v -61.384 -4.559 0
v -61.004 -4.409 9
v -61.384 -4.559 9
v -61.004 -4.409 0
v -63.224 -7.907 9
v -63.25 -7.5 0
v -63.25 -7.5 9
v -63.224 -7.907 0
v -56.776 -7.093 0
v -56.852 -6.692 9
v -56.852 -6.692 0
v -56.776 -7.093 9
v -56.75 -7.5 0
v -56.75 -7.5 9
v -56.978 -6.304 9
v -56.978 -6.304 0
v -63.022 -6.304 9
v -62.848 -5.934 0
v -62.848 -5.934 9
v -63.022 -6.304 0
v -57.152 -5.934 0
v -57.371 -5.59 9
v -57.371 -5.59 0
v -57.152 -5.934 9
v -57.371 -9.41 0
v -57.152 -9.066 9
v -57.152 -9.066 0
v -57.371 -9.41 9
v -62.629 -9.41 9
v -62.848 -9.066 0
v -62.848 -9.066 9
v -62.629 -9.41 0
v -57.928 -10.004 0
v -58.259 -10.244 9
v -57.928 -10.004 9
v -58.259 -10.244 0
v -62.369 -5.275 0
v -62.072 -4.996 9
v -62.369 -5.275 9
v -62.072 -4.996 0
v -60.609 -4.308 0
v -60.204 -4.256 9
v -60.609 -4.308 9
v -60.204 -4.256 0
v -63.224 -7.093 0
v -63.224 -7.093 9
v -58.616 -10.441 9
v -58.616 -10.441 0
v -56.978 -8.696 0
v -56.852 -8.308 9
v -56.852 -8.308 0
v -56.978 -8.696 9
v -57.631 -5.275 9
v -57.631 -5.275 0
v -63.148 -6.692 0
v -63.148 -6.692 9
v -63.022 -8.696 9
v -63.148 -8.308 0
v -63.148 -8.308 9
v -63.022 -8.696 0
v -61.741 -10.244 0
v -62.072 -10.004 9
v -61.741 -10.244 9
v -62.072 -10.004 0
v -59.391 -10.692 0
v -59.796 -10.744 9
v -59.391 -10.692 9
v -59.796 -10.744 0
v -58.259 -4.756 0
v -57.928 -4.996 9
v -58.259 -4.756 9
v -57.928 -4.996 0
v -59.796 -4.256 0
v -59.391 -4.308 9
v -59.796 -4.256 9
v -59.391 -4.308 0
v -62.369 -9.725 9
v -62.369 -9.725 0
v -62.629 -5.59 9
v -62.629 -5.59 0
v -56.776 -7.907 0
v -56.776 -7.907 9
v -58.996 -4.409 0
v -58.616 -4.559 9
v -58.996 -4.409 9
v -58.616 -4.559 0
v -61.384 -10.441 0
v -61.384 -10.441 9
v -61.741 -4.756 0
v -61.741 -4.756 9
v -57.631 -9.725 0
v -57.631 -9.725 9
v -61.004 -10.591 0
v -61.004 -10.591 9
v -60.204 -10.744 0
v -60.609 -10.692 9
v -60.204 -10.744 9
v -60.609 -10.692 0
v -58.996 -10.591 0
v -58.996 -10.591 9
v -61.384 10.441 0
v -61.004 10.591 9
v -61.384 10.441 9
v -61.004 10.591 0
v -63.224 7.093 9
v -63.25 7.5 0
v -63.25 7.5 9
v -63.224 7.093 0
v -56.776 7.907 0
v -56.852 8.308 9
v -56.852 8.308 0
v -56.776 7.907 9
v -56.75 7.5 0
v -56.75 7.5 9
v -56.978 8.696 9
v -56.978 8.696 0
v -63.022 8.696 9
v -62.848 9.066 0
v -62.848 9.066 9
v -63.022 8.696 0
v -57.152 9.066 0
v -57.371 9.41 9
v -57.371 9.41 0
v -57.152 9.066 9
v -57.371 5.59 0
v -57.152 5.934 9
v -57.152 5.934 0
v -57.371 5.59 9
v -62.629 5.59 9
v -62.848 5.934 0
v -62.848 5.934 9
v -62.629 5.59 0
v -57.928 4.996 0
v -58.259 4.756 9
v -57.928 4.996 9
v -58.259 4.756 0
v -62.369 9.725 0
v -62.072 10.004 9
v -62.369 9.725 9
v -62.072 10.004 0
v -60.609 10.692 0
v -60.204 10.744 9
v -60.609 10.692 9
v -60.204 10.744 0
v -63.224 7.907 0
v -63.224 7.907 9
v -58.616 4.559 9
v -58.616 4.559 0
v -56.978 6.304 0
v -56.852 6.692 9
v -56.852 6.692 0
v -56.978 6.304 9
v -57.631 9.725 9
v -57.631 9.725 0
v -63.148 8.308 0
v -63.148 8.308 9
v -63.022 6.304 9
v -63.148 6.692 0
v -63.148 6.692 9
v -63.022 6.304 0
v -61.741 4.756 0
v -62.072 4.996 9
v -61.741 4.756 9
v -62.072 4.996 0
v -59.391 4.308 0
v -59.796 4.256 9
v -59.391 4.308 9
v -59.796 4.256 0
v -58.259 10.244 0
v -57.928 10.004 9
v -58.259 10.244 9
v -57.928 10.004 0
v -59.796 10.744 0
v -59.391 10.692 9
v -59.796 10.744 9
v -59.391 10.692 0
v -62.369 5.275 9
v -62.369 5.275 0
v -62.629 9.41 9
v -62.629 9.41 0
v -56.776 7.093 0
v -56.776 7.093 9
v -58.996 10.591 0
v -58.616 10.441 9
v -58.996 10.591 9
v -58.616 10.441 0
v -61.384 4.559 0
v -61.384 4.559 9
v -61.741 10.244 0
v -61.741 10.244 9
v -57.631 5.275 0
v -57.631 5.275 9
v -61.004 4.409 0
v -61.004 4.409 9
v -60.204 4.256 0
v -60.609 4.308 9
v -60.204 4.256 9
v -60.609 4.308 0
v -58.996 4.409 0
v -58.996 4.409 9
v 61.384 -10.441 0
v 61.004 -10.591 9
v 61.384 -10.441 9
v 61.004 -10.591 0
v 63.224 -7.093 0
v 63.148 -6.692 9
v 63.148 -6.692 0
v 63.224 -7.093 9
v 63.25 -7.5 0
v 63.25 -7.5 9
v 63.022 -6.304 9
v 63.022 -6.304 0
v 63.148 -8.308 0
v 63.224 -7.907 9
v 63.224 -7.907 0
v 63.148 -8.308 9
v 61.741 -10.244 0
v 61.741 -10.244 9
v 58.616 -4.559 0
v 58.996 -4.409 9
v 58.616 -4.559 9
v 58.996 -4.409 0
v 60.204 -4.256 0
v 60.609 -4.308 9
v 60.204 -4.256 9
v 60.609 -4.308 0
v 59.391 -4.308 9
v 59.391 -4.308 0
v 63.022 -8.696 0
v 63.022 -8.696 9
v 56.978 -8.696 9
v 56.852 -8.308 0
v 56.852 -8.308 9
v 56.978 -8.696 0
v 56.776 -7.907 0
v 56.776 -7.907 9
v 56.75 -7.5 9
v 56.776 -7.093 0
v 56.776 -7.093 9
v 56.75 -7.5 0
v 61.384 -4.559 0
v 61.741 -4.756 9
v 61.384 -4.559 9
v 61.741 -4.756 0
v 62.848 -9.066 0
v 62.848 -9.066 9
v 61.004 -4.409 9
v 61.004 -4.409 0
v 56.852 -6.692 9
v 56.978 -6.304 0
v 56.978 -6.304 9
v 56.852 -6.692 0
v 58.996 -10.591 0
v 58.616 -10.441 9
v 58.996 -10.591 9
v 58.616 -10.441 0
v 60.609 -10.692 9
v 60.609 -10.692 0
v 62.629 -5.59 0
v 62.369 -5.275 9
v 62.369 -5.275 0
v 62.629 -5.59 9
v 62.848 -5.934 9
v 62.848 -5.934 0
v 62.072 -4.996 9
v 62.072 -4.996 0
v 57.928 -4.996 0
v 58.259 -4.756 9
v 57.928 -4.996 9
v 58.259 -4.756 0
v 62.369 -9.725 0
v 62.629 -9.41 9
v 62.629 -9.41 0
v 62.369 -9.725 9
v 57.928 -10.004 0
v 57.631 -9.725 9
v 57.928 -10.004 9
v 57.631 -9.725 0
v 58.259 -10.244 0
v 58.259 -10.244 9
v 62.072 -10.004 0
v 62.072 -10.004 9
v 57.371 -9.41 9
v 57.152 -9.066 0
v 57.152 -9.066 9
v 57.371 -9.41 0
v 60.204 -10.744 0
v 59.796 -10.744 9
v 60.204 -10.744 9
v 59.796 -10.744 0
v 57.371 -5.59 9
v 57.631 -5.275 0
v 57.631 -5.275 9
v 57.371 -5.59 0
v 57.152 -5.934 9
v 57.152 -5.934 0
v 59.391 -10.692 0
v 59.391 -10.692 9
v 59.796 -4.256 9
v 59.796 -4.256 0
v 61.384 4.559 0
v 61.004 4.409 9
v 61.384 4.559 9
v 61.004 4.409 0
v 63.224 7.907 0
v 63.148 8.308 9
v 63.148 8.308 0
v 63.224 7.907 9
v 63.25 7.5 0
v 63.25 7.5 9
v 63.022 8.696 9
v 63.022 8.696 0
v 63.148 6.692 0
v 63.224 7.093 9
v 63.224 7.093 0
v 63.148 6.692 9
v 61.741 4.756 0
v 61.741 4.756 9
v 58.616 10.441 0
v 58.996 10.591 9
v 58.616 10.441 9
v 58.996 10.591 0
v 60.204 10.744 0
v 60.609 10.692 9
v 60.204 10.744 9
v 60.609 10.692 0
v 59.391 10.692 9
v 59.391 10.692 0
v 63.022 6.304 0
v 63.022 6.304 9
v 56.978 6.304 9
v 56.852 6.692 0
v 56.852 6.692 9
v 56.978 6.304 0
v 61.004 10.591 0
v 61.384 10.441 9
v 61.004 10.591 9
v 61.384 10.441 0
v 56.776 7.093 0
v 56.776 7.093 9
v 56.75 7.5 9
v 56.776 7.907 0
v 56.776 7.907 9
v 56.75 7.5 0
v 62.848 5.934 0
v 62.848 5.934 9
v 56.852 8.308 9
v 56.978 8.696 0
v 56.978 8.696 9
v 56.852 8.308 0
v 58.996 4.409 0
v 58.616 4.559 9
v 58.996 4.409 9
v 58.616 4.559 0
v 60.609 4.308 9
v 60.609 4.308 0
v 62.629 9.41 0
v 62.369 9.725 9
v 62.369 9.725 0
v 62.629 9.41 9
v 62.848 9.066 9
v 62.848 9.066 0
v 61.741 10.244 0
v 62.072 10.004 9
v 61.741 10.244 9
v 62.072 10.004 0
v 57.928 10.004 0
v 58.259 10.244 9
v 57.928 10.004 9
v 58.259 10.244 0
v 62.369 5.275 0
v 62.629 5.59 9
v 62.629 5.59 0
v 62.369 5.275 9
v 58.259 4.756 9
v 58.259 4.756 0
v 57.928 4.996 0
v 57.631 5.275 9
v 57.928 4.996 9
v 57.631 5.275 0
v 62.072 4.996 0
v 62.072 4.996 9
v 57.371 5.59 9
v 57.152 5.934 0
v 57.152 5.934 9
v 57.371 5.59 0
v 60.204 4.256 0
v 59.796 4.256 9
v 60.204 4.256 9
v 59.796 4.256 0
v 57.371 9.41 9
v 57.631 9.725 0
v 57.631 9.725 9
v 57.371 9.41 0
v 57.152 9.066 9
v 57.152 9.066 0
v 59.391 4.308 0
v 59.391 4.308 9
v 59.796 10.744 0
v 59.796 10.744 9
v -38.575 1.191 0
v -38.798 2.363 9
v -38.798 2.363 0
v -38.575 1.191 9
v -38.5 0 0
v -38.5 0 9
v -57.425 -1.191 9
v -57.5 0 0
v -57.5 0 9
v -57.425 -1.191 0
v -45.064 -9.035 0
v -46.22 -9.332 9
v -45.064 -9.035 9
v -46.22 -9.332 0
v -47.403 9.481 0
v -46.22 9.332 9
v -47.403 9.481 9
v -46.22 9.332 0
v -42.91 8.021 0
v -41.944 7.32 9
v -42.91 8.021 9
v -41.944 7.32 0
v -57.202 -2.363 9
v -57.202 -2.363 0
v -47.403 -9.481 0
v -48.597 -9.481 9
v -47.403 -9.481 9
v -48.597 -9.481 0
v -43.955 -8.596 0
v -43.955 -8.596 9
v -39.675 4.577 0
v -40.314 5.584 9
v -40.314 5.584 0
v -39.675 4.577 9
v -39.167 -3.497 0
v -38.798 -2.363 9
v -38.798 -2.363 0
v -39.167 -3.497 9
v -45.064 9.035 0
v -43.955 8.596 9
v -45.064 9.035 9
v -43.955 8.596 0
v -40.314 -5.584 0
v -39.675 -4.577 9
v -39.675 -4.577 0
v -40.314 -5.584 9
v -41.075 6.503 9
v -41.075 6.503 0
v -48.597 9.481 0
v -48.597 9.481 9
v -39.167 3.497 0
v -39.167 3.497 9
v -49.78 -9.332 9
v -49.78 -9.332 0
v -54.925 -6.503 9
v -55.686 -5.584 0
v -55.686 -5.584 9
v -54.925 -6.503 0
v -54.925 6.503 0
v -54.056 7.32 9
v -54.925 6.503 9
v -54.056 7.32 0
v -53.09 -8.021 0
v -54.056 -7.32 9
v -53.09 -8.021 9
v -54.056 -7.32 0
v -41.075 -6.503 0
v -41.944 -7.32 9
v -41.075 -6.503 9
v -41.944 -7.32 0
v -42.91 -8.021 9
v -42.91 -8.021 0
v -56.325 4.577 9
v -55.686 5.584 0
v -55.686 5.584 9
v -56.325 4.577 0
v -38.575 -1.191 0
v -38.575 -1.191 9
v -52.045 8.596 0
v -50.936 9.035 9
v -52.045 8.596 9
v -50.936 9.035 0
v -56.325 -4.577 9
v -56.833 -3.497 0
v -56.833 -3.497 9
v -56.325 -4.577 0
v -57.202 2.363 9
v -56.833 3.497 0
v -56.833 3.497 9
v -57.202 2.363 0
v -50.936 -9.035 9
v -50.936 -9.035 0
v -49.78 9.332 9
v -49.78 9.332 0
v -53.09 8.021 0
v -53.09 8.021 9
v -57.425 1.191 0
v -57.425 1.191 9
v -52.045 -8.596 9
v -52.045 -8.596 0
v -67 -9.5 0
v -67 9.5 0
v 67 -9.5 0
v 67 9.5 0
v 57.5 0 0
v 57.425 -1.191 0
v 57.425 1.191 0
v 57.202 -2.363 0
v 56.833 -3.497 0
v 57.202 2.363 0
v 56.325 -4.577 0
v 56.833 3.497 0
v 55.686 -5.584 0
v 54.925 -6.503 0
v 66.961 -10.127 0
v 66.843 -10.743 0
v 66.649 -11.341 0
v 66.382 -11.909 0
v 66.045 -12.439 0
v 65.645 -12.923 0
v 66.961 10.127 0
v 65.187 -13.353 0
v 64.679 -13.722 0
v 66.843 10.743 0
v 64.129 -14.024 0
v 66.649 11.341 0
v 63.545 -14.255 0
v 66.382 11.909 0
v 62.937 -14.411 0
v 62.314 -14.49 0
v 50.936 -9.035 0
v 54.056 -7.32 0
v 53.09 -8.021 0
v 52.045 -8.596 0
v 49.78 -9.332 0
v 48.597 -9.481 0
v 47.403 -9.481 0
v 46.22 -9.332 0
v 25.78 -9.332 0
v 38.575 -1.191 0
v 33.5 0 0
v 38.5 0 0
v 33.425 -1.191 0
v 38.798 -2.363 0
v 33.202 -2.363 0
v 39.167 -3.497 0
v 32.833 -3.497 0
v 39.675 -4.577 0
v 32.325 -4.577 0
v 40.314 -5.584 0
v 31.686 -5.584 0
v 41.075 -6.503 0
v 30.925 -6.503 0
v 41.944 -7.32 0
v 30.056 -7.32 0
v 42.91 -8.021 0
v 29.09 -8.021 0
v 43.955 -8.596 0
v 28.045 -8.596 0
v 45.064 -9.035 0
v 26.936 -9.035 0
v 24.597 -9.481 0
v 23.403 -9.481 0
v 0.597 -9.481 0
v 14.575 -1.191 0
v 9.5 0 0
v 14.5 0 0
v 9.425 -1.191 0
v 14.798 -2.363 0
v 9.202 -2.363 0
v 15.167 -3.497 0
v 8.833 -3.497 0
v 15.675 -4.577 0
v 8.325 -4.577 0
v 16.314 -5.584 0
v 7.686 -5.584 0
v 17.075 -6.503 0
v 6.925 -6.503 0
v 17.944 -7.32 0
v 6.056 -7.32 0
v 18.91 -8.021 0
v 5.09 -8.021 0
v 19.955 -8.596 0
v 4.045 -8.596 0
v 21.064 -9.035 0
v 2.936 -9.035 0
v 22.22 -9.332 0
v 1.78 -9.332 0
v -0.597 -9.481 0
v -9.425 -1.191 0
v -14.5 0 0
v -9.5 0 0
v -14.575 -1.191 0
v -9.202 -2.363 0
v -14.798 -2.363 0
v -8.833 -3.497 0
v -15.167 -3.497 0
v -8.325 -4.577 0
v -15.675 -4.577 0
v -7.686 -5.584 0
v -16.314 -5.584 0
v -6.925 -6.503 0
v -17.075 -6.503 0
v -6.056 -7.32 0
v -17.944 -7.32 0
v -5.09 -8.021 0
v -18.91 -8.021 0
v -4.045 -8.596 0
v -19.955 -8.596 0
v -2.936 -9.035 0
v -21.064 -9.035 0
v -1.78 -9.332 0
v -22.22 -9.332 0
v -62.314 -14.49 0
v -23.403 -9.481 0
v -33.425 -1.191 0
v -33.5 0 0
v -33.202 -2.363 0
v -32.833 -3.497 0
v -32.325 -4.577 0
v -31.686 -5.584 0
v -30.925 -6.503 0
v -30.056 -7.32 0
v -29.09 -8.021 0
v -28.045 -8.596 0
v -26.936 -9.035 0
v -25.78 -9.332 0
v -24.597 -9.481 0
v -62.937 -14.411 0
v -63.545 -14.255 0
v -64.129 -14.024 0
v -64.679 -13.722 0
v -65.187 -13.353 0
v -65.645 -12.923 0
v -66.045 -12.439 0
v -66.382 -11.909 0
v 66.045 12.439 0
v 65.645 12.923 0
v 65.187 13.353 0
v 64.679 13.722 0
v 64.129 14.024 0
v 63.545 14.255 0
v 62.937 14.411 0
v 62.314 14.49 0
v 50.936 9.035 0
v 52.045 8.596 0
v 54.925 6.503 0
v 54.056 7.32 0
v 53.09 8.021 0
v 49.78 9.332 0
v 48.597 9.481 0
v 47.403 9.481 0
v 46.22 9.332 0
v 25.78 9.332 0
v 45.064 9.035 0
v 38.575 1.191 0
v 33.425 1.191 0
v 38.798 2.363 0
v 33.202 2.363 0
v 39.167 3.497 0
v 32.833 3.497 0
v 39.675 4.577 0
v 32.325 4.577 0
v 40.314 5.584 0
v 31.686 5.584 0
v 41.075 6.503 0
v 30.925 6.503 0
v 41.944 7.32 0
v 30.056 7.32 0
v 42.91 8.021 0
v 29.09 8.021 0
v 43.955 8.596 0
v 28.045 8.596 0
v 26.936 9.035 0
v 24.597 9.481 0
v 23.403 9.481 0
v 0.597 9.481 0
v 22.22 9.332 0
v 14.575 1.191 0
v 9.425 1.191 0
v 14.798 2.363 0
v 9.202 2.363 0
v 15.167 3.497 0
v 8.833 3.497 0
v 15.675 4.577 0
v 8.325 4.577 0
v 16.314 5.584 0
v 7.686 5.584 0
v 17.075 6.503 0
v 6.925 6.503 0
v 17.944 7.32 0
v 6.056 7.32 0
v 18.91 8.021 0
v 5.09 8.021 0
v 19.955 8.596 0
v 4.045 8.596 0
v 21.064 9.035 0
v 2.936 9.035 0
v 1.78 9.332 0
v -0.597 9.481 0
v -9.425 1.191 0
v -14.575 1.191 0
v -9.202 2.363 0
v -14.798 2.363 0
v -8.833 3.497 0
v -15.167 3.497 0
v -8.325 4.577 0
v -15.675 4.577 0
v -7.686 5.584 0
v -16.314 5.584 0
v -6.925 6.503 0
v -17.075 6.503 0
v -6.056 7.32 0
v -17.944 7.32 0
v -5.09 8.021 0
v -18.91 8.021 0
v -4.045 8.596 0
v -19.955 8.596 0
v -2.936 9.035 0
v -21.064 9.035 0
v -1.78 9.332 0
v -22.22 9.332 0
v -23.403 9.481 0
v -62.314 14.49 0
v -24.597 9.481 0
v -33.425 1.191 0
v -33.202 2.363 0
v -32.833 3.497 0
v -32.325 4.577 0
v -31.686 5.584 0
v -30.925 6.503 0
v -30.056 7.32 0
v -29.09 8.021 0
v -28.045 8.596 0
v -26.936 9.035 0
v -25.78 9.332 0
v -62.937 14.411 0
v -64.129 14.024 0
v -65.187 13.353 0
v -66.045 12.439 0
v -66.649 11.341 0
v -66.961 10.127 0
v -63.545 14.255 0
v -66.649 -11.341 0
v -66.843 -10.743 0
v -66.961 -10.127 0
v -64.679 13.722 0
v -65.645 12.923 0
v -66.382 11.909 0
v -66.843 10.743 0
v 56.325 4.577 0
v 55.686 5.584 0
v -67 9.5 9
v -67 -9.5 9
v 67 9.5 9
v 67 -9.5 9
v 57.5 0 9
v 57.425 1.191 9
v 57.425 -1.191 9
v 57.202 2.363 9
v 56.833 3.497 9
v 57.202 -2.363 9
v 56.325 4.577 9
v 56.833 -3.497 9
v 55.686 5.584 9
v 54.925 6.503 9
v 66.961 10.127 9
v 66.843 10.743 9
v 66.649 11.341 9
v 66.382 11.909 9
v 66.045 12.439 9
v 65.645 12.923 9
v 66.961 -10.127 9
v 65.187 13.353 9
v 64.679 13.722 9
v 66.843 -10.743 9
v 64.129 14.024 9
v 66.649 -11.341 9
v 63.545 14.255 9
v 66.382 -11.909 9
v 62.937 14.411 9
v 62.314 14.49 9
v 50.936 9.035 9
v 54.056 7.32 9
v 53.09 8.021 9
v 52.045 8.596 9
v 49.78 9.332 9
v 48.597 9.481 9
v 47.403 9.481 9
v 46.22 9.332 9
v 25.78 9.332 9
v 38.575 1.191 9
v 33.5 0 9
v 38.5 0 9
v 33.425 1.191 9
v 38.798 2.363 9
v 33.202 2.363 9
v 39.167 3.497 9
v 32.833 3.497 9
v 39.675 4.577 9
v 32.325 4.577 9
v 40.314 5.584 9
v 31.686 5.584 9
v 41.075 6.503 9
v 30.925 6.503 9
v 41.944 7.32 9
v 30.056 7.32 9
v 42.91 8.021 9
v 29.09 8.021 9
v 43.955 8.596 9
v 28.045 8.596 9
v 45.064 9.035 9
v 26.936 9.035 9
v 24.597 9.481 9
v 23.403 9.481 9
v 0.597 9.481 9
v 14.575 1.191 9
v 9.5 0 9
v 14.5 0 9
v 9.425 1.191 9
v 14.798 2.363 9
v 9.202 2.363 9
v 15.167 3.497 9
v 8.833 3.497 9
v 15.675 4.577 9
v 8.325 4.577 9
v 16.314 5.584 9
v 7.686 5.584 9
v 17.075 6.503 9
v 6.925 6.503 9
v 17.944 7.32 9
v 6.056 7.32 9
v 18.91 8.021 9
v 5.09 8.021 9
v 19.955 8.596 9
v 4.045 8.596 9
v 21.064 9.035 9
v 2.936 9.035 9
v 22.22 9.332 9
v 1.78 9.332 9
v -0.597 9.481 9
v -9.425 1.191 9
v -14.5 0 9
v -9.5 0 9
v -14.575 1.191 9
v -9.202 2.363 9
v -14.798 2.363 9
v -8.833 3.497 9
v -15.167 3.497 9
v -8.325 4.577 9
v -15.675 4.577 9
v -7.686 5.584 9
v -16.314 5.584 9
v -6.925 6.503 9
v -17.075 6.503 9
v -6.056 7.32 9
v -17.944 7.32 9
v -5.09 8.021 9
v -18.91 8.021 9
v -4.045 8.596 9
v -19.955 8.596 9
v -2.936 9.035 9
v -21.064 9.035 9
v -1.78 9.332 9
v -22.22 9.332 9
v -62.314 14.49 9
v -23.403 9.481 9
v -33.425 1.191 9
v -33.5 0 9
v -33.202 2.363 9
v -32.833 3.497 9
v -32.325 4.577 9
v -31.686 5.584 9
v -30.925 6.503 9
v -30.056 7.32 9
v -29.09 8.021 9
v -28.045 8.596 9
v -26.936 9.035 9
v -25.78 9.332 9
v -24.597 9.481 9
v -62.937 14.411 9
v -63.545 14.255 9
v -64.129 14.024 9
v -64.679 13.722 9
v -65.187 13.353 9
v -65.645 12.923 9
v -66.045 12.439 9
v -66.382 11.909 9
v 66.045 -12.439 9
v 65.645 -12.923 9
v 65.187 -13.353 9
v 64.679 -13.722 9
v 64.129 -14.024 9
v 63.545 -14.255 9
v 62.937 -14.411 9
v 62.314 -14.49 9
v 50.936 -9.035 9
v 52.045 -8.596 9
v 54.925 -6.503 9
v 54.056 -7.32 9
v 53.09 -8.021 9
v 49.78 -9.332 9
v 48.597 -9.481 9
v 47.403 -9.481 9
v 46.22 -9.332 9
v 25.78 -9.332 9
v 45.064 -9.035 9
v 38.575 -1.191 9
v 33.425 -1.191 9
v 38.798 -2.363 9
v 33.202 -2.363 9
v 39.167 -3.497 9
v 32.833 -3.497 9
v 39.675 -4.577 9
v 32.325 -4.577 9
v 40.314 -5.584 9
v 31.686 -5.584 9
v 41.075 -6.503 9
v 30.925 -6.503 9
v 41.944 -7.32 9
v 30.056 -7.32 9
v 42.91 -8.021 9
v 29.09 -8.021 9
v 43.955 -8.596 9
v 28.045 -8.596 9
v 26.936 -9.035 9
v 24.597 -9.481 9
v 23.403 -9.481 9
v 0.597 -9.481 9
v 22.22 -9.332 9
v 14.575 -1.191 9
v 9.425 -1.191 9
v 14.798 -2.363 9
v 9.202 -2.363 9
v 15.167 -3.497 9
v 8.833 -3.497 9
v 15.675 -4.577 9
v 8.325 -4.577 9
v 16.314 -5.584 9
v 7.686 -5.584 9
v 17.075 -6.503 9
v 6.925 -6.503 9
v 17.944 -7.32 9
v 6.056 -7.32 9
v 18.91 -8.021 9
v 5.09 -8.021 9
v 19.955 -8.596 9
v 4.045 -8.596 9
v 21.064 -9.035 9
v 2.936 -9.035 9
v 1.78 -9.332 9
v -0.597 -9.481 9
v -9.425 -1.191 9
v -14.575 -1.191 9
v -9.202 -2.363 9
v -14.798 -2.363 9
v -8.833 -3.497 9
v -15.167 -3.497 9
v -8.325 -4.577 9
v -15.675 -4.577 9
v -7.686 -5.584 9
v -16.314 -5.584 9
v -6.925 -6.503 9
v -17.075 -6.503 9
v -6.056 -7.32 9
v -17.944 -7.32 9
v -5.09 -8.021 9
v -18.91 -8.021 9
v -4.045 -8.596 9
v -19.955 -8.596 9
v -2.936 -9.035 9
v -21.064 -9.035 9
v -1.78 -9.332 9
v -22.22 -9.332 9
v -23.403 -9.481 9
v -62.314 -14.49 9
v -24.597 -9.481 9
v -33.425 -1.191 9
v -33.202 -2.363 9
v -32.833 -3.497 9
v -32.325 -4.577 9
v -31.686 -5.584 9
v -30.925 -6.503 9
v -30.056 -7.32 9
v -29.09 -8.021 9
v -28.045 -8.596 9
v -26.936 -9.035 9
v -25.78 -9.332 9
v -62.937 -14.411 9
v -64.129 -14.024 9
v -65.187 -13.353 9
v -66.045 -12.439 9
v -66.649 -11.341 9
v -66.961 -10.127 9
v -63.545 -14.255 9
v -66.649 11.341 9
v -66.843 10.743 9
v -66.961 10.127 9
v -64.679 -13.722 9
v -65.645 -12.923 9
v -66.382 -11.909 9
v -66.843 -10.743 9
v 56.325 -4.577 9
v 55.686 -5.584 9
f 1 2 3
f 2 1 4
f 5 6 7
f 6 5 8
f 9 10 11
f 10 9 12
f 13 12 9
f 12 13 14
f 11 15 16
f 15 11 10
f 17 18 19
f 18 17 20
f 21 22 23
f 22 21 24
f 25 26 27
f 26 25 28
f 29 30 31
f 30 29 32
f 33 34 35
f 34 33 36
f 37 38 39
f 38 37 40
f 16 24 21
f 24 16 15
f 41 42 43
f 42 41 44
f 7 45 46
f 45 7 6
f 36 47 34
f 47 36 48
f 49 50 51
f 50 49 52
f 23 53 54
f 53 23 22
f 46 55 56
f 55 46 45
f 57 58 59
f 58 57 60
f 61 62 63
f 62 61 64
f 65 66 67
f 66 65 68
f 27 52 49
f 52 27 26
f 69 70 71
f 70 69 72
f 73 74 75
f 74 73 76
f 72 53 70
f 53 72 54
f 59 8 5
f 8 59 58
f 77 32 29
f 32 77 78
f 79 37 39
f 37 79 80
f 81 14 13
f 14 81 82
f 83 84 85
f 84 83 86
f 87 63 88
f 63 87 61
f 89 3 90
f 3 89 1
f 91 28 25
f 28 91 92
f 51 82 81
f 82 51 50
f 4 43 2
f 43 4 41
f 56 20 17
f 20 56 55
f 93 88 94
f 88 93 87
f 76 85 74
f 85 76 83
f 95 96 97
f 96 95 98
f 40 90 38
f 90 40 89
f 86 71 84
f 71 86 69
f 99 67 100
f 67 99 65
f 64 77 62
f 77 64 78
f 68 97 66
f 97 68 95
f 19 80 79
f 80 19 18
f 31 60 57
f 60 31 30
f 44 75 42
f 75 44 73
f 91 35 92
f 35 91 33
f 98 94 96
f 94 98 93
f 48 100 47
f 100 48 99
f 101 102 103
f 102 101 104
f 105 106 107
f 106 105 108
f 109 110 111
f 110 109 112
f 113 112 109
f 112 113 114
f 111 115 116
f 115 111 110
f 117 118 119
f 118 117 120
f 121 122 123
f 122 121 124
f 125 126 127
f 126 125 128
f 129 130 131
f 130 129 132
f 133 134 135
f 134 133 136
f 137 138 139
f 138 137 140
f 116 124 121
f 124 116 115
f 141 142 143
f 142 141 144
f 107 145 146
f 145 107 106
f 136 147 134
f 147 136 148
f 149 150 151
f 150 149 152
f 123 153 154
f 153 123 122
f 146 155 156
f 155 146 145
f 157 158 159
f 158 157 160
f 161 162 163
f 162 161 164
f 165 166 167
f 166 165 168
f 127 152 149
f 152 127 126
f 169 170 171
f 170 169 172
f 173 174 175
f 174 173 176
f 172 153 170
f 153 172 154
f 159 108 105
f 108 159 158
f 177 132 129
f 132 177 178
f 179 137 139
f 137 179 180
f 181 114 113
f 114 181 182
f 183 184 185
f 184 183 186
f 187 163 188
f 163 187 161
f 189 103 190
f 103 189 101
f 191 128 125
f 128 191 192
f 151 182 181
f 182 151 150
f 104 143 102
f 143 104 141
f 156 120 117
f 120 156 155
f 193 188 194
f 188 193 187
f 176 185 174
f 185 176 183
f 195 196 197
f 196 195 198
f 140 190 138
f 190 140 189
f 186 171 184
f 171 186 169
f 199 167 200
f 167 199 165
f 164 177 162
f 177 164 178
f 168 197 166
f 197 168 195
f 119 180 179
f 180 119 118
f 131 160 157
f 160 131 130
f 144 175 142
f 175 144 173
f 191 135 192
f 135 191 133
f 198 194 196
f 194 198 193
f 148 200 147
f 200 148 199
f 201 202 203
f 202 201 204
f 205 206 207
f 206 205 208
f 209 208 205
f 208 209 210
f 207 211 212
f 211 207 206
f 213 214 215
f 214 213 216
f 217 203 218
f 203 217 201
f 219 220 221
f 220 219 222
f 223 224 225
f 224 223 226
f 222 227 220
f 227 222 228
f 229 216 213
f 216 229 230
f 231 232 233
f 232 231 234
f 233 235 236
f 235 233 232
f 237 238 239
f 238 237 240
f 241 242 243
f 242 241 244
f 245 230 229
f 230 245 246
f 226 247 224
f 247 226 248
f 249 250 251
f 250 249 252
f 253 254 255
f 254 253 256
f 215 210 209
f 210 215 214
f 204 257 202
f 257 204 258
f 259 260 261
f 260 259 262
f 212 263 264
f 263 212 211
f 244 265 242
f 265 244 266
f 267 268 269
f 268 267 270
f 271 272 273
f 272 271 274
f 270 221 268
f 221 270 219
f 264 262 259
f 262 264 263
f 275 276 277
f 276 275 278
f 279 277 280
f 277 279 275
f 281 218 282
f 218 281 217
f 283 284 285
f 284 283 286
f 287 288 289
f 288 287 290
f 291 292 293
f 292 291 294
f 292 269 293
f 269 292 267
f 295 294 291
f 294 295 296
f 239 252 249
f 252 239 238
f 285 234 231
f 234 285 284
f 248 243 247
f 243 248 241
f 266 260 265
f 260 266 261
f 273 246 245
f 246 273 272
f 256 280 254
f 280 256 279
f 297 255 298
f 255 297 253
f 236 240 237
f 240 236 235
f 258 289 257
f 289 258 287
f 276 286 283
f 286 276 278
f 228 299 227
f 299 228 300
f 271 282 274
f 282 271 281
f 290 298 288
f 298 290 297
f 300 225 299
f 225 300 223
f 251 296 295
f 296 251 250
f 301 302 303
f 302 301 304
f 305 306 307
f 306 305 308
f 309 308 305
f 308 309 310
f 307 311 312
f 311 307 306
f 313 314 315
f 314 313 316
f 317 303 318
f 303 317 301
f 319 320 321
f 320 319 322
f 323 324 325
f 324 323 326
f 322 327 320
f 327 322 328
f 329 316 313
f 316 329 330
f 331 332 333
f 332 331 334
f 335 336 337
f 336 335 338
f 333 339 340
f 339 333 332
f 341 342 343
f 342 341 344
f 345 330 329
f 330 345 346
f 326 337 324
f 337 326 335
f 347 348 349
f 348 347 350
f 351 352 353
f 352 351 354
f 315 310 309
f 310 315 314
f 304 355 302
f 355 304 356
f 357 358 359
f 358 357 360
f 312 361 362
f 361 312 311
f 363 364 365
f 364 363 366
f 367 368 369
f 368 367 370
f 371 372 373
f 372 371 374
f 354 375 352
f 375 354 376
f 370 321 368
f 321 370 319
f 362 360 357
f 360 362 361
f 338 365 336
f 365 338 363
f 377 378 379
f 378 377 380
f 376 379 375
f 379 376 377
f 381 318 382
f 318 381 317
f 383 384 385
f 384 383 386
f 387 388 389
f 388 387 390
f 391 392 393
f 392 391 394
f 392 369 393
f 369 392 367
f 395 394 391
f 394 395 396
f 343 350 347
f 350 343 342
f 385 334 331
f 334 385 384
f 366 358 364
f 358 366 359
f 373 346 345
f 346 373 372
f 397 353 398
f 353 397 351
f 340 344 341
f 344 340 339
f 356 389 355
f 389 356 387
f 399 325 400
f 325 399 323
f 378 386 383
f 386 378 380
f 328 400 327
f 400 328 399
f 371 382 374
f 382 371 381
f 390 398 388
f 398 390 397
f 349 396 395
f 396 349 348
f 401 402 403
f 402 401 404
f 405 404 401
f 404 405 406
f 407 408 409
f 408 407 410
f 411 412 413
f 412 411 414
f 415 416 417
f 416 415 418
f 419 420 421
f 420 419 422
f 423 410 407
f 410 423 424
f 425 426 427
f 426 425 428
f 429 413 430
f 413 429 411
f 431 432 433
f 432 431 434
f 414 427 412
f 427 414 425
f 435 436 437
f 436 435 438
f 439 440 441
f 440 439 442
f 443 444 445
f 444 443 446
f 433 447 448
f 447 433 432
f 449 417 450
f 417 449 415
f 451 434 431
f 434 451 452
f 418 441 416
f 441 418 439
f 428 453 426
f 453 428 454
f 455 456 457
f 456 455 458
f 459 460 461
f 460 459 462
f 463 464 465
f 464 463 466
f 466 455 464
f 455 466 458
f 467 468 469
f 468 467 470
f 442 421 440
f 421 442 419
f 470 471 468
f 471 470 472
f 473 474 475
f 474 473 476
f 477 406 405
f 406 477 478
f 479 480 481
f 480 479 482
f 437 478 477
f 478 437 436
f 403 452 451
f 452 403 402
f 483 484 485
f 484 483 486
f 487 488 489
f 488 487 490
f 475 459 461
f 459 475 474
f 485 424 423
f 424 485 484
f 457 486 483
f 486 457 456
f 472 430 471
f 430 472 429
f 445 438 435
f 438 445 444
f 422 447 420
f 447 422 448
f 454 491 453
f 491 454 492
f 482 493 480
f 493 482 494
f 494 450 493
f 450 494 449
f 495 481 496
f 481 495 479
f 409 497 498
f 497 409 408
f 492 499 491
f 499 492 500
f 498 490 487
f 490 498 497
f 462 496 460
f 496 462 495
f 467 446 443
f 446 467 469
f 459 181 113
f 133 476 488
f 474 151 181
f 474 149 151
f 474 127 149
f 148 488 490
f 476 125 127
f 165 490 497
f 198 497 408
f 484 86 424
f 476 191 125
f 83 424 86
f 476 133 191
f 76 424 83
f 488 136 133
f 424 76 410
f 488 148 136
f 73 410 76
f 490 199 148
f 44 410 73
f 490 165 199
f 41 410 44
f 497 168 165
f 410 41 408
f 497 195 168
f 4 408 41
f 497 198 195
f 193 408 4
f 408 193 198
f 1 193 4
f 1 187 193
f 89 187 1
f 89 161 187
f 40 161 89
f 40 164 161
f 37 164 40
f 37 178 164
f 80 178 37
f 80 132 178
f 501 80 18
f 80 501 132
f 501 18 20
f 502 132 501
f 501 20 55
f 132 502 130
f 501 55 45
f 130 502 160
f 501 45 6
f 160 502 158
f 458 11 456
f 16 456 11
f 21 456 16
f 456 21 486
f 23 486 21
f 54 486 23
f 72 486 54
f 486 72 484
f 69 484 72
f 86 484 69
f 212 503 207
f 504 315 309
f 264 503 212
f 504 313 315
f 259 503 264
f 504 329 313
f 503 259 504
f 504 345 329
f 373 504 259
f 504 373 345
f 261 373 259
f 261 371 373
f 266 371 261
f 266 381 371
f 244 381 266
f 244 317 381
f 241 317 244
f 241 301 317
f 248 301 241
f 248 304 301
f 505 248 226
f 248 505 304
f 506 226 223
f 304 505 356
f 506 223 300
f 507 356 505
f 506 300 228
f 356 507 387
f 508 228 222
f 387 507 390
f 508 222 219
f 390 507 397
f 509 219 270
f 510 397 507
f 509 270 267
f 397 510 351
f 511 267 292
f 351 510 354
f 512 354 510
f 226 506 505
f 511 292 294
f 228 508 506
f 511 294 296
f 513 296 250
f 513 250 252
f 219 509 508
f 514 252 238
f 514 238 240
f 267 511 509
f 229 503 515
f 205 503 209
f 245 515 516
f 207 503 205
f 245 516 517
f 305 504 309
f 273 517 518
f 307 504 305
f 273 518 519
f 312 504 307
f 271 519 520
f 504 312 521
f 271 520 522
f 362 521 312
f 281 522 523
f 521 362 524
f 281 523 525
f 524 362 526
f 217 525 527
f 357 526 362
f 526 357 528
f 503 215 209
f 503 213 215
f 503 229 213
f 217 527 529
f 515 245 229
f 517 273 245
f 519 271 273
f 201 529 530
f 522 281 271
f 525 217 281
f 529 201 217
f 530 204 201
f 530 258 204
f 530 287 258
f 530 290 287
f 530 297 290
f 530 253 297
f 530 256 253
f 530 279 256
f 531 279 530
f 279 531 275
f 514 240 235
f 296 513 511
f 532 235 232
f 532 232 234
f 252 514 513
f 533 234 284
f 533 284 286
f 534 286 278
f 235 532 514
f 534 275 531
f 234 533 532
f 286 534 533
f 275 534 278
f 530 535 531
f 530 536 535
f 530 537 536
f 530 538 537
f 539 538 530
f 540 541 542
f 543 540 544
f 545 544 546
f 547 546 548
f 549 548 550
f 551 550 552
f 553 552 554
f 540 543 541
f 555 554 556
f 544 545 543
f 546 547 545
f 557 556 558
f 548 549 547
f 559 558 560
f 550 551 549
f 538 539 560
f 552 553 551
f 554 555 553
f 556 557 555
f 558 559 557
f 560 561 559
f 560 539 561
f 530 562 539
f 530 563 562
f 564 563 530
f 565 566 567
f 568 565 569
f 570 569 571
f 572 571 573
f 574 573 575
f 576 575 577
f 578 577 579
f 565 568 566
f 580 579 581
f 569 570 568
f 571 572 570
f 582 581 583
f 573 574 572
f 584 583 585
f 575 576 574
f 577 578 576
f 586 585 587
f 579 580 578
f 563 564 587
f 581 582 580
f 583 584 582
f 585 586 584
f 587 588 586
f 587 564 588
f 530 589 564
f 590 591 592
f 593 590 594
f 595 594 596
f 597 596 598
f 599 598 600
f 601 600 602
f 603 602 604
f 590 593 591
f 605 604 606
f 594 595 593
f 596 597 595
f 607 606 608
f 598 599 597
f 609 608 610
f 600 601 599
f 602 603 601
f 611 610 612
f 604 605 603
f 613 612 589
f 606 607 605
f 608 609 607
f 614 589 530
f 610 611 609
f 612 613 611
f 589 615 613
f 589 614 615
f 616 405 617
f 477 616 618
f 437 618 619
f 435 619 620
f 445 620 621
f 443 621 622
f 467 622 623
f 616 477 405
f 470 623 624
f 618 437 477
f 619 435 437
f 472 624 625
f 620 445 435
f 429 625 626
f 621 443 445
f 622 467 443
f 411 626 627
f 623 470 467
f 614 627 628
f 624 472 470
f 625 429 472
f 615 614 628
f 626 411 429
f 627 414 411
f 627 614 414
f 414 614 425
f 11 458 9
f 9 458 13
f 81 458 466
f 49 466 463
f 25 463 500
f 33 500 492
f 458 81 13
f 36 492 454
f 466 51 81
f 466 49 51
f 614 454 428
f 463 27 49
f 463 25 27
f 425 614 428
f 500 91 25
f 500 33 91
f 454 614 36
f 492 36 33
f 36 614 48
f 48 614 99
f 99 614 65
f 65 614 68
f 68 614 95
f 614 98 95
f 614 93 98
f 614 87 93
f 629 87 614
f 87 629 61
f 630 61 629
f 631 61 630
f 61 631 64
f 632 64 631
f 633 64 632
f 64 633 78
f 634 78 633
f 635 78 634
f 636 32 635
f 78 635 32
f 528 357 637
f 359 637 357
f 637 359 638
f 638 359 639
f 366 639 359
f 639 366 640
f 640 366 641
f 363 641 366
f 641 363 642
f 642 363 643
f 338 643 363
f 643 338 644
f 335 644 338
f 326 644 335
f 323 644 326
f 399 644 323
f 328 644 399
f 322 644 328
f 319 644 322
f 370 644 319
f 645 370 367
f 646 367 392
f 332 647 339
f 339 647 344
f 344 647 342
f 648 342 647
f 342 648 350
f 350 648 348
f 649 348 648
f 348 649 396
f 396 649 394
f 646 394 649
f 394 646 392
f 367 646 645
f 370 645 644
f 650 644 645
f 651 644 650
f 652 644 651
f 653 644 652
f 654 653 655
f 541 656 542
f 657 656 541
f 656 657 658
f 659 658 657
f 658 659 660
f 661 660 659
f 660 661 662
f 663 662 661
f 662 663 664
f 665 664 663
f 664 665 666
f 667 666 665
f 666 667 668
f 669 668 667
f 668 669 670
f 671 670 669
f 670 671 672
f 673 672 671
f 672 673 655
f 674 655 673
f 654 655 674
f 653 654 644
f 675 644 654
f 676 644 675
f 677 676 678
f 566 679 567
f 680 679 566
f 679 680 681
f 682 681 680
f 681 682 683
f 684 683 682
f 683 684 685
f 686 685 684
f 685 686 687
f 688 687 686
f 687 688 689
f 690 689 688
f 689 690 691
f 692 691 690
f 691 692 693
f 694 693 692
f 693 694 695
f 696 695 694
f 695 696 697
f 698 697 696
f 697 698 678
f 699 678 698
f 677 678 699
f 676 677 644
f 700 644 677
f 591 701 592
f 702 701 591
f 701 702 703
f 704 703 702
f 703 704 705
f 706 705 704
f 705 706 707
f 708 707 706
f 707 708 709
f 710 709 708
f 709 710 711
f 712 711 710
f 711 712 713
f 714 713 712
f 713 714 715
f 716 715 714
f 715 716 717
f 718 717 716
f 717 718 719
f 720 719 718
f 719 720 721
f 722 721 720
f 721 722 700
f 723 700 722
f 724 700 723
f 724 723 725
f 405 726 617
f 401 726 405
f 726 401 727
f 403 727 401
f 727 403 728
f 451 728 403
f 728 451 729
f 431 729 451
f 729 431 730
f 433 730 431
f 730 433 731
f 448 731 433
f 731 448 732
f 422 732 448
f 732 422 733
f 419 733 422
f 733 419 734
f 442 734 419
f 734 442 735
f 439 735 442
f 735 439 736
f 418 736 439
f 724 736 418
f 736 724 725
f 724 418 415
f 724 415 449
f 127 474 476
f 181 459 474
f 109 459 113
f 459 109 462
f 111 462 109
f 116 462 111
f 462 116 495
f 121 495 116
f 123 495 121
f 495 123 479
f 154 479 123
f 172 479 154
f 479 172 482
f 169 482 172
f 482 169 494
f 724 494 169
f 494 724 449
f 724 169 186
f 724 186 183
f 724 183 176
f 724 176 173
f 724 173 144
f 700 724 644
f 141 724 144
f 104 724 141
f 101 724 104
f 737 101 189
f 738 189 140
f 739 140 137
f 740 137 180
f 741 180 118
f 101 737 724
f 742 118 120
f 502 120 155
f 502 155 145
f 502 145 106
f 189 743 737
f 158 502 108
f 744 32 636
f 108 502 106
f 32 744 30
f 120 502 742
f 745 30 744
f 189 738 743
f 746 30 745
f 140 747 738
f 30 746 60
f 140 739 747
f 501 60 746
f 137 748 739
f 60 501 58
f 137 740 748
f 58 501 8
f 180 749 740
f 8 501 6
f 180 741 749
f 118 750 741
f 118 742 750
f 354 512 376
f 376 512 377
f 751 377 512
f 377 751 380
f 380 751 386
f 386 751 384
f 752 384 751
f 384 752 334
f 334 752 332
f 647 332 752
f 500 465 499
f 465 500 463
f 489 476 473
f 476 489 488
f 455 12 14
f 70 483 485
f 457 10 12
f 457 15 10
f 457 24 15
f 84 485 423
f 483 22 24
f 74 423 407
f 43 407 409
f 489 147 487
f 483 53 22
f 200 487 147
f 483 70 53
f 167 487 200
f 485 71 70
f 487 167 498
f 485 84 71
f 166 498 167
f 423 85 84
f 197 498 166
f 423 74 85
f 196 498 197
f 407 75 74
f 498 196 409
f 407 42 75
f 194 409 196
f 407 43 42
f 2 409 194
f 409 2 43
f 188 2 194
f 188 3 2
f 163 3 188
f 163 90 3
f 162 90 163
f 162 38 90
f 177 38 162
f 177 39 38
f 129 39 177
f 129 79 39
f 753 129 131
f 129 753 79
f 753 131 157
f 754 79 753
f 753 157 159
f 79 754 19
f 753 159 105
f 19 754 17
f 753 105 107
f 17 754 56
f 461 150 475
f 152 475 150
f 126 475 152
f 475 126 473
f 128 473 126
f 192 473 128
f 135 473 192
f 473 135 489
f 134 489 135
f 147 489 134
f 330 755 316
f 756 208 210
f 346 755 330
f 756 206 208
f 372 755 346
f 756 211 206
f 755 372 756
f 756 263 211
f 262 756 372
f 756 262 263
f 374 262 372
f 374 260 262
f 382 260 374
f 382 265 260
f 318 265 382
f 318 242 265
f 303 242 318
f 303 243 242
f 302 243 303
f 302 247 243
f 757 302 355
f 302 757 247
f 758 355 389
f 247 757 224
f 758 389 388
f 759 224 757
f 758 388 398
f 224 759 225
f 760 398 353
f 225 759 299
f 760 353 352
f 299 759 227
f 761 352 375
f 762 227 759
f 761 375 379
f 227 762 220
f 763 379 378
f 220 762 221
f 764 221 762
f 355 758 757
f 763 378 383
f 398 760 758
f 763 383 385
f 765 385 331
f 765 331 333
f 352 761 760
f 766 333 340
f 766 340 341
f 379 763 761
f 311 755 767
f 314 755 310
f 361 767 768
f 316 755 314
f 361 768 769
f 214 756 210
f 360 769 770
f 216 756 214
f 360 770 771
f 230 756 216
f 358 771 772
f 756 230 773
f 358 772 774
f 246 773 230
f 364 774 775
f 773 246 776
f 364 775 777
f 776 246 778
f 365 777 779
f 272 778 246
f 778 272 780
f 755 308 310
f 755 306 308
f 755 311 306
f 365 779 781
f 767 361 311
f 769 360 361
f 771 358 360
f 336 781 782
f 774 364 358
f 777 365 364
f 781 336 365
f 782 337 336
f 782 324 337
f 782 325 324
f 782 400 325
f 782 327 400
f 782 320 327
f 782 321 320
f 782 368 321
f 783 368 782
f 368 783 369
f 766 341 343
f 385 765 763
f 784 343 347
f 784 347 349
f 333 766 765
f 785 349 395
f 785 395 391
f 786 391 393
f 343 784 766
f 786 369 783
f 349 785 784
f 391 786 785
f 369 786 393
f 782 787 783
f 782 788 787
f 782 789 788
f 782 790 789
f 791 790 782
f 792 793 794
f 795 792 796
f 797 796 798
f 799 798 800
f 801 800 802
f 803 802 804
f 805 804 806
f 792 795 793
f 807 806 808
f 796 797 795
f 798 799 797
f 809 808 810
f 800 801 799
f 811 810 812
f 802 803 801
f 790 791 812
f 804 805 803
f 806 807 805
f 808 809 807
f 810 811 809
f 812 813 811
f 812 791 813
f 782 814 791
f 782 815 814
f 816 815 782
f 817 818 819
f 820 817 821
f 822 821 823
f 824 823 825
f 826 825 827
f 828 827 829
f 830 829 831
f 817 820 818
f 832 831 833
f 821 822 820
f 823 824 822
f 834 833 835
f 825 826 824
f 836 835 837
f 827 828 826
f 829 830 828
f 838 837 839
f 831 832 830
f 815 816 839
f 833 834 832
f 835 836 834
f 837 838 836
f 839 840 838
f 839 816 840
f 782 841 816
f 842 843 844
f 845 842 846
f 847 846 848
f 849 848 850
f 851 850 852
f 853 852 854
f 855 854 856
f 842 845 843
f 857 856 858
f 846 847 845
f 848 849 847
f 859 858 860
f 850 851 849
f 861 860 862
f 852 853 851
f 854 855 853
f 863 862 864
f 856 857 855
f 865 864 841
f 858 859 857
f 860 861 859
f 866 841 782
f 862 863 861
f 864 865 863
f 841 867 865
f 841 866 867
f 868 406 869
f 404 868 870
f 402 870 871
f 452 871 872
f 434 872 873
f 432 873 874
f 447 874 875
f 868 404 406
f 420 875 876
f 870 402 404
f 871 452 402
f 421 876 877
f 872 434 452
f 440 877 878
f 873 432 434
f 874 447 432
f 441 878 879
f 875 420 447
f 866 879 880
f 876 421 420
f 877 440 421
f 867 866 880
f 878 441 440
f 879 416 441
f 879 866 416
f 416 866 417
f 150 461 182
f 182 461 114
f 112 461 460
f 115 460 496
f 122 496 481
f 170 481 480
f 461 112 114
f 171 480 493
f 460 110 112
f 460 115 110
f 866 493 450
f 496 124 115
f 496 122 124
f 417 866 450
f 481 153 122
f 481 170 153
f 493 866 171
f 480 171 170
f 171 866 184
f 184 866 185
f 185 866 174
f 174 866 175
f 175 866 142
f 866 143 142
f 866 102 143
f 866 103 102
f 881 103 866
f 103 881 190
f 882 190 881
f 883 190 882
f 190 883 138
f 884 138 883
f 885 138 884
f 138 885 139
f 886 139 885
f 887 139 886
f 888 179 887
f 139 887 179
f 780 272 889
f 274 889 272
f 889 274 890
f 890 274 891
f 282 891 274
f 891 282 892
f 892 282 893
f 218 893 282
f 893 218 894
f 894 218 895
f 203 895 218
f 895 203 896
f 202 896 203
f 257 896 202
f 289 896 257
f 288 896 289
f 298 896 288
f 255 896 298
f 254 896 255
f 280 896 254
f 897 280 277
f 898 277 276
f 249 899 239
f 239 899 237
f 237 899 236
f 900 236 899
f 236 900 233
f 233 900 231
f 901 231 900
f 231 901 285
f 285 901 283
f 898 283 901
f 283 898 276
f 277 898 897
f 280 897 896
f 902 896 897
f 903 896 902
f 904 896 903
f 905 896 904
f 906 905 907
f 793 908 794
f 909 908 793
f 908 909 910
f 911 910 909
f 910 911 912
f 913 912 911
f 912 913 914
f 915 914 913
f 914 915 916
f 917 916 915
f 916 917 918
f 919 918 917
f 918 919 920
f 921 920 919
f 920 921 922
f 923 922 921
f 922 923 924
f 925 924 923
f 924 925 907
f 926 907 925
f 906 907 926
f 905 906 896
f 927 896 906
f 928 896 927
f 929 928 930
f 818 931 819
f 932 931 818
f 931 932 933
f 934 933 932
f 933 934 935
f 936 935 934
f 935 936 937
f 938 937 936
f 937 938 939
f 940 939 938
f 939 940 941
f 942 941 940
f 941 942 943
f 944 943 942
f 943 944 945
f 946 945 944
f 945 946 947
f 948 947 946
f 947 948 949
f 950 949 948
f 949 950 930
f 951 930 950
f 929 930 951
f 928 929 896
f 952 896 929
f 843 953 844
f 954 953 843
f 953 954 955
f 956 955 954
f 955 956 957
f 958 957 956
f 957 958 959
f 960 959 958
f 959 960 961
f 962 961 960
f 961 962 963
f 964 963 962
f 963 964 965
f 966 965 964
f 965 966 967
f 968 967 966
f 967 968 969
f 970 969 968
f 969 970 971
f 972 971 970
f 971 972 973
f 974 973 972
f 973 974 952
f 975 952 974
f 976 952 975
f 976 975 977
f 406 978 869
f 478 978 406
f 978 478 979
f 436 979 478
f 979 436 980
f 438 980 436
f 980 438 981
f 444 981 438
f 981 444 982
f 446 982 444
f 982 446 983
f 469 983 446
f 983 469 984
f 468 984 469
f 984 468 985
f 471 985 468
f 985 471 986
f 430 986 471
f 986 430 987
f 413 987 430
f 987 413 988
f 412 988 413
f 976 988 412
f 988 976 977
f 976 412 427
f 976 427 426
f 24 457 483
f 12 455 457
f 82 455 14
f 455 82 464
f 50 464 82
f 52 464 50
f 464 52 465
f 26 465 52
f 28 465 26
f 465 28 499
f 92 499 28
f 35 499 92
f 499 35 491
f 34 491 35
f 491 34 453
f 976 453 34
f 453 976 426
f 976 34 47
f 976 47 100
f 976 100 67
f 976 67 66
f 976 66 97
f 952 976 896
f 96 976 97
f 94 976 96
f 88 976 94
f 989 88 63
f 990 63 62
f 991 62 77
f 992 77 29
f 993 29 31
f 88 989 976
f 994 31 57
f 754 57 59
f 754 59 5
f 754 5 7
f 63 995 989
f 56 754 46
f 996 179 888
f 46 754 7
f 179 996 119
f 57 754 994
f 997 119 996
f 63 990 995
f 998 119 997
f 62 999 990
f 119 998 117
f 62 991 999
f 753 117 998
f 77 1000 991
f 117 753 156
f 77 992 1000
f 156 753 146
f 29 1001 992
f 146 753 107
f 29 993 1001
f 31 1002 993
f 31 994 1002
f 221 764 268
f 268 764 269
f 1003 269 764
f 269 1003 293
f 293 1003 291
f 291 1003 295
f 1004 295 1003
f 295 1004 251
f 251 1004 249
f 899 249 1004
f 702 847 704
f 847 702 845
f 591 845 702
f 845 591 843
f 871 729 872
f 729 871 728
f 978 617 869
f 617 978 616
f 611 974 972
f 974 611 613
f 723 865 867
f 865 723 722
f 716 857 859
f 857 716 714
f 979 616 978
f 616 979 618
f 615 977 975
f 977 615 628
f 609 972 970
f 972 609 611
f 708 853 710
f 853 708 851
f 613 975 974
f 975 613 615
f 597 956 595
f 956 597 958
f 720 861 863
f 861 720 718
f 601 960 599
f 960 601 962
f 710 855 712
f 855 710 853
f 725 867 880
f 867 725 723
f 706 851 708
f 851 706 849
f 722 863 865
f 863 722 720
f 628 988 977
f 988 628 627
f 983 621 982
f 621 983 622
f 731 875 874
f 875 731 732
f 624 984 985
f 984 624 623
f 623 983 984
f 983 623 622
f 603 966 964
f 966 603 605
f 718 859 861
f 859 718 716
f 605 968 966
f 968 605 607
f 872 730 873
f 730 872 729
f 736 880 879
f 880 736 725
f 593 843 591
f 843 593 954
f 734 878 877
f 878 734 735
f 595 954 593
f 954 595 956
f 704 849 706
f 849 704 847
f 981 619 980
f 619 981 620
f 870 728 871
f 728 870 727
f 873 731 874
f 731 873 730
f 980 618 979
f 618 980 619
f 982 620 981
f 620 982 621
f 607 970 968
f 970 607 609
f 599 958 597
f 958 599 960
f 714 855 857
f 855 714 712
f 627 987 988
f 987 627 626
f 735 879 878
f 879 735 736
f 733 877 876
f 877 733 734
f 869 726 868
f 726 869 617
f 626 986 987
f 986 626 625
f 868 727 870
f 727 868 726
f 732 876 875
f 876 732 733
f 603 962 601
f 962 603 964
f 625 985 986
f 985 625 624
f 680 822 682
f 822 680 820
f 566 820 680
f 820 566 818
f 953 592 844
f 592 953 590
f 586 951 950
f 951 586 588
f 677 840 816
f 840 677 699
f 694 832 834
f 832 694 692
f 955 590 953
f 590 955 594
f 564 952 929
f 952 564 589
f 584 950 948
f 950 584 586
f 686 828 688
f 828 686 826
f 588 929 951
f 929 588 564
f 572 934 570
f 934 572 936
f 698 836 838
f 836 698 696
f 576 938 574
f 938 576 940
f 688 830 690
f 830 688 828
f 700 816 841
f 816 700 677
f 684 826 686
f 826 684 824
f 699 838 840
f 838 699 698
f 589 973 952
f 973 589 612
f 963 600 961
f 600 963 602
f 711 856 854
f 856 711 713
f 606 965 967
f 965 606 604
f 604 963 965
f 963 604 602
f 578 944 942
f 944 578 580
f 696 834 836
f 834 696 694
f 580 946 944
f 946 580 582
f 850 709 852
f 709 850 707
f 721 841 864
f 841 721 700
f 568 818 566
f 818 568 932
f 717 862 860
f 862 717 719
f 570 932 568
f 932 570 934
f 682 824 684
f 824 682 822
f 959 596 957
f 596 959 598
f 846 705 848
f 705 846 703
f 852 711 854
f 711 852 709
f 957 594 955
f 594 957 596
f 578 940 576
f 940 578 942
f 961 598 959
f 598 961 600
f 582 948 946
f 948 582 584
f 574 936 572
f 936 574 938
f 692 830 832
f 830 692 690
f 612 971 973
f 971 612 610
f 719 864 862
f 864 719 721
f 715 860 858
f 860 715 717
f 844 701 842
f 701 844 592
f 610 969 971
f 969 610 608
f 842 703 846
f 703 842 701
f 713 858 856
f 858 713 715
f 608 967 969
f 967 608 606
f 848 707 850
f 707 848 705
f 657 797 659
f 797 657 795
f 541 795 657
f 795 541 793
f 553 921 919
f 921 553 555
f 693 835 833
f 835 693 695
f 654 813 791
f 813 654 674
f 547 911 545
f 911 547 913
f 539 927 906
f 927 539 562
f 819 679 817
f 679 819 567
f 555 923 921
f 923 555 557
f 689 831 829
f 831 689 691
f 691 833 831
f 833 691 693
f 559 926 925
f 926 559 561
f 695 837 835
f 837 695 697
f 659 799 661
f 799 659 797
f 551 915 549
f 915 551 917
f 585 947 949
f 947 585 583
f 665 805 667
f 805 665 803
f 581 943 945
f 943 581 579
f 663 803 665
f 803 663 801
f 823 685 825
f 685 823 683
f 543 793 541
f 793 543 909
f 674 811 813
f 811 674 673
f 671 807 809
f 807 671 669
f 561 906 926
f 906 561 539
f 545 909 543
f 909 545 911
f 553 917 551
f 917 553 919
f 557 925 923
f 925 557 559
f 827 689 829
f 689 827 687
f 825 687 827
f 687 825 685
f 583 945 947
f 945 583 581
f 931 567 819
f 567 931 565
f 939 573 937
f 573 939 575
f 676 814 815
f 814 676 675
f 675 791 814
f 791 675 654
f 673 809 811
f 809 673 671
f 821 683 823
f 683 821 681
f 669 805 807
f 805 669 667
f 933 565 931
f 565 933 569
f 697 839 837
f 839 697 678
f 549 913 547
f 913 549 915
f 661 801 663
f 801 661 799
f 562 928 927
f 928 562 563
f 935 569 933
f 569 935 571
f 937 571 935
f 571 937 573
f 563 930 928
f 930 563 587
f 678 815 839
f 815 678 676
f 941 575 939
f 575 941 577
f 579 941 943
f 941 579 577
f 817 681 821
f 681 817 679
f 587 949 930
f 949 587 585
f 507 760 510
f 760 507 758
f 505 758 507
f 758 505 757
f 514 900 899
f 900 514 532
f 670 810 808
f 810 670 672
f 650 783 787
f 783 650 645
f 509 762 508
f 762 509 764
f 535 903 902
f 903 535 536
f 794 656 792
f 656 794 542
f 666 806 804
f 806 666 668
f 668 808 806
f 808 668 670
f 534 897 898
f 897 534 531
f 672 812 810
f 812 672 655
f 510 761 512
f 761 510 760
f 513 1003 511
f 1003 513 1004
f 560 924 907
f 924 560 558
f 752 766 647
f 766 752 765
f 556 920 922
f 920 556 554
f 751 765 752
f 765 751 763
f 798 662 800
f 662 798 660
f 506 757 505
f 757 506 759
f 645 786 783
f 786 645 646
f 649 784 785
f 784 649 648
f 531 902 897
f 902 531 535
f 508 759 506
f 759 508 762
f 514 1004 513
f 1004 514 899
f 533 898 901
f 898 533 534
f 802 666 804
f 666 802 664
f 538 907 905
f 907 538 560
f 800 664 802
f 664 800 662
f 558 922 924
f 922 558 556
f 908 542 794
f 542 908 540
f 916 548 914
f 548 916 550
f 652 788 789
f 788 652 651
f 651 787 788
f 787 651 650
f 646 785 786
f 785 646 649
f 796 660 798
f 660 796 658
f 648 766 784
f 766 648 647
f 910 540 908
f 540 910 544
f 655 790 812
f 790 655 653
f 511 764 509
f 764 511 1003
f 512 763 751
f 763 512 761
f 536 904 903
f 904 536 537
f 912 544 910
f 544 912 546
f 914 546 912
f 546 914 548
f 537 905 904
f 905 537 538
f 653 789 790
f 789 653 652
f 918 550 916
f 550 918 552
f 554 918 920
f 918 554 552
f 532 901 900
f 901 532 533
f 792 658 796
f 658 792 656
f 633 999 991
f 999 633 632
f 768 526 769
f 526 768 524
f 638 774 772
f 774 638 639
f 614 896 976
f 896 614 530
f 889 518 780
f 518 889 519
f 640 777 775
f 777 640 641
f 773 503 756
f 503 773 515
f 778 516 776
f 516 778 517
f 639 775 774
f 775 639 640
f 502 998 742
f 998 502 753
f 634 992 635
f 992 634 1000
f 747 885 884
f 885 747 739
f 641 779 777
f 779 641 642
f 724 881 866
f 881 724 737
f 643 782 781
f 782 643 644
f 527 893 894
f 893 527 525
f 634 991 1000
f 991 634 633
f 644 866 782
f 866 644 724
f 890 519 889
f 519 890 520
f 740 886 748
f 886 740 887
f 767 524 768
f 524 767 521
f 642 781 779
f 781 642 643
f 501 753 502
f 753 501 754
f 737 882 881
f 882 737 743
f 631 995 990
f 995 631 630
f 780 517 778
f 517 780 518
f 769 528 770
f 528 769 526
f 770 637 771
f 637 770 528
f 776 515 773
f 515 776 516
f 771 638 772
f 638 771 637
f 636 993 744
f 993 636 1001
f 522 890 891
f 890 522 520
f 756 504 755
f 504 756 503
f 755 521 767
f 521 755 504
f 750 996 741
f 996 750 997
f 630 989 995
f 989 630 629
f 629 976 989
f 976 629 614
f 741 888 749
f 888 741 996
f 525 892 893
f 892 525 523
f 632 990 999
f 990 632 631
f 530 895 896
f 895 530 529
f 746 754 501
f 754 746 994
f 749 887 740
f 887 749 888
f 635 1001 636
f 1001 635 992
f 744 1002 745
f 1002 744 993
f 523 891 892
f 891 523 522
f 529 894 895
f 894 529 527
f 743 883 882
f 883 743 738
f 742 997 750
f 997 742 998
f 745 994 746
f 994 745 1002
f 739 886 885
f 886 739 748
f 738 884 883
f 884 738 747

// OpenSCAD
$fn = 50;


difference() {
	union() {
		hull() {
			translate(v = [-62.0000000000, 9.5000000000, 0]) {
				cylinder(h = 9, r = 5);
			}
			translate(v = [62.0000000000, 9.5000000000, 0]) {
				cylinder(h = 9, r = 5);
			}
			translate(v = [-62.0000000000, -9.5000000000, 0]) {
				cylinder(h = 9, r = 5);
			}
			translate(v = [62.0000000000, -9.5000000000, 0]) {
				cylinder(h = 9, r = 5);
			}
		}
	}
	union() {
		#translate(v = [-60.0000000000, -7.5000000000, -100.0000000000]) {
			cylinder(h = 200, r = 3.2500000000);
		}
		#translate(v = [-60.0000000000, 7.5000000000, -100.0000000000]) {
			cylinder(h = 200, r = 3.2500000000);
		}
		#translate(v = [60.0000000000, -7.5000000000, -100.0000000000]) {
			cylinder(h = 200, r = 3.2500000000);
		}
		#translate(v = [60.0000000000, 7.5000000000, -100.0000000000]) {
			cylinder(h = 200, r = 3.2500000000);
		}
		#translate(v = [-48.0000000000, 0, 0]) {
			cylinder(h = 9, r = 9.5000000000);
		}
		#translate(v = [-24.0000000000, 0, 0]) {
			cylinder(h = 9, r = 9.5000000000);
		}
		#cylinder(h = 9, r = 9.5000000000);
		#translate(v = [24.0000000000, 0, 0]) {
			cylinder(h = 9, r = 9.5000000000);
		}
		#translate(v = [48.0000000000, 0, 0]) {
			cylinder(h = 9, r = 9.5000000000);
		}
	}
}
